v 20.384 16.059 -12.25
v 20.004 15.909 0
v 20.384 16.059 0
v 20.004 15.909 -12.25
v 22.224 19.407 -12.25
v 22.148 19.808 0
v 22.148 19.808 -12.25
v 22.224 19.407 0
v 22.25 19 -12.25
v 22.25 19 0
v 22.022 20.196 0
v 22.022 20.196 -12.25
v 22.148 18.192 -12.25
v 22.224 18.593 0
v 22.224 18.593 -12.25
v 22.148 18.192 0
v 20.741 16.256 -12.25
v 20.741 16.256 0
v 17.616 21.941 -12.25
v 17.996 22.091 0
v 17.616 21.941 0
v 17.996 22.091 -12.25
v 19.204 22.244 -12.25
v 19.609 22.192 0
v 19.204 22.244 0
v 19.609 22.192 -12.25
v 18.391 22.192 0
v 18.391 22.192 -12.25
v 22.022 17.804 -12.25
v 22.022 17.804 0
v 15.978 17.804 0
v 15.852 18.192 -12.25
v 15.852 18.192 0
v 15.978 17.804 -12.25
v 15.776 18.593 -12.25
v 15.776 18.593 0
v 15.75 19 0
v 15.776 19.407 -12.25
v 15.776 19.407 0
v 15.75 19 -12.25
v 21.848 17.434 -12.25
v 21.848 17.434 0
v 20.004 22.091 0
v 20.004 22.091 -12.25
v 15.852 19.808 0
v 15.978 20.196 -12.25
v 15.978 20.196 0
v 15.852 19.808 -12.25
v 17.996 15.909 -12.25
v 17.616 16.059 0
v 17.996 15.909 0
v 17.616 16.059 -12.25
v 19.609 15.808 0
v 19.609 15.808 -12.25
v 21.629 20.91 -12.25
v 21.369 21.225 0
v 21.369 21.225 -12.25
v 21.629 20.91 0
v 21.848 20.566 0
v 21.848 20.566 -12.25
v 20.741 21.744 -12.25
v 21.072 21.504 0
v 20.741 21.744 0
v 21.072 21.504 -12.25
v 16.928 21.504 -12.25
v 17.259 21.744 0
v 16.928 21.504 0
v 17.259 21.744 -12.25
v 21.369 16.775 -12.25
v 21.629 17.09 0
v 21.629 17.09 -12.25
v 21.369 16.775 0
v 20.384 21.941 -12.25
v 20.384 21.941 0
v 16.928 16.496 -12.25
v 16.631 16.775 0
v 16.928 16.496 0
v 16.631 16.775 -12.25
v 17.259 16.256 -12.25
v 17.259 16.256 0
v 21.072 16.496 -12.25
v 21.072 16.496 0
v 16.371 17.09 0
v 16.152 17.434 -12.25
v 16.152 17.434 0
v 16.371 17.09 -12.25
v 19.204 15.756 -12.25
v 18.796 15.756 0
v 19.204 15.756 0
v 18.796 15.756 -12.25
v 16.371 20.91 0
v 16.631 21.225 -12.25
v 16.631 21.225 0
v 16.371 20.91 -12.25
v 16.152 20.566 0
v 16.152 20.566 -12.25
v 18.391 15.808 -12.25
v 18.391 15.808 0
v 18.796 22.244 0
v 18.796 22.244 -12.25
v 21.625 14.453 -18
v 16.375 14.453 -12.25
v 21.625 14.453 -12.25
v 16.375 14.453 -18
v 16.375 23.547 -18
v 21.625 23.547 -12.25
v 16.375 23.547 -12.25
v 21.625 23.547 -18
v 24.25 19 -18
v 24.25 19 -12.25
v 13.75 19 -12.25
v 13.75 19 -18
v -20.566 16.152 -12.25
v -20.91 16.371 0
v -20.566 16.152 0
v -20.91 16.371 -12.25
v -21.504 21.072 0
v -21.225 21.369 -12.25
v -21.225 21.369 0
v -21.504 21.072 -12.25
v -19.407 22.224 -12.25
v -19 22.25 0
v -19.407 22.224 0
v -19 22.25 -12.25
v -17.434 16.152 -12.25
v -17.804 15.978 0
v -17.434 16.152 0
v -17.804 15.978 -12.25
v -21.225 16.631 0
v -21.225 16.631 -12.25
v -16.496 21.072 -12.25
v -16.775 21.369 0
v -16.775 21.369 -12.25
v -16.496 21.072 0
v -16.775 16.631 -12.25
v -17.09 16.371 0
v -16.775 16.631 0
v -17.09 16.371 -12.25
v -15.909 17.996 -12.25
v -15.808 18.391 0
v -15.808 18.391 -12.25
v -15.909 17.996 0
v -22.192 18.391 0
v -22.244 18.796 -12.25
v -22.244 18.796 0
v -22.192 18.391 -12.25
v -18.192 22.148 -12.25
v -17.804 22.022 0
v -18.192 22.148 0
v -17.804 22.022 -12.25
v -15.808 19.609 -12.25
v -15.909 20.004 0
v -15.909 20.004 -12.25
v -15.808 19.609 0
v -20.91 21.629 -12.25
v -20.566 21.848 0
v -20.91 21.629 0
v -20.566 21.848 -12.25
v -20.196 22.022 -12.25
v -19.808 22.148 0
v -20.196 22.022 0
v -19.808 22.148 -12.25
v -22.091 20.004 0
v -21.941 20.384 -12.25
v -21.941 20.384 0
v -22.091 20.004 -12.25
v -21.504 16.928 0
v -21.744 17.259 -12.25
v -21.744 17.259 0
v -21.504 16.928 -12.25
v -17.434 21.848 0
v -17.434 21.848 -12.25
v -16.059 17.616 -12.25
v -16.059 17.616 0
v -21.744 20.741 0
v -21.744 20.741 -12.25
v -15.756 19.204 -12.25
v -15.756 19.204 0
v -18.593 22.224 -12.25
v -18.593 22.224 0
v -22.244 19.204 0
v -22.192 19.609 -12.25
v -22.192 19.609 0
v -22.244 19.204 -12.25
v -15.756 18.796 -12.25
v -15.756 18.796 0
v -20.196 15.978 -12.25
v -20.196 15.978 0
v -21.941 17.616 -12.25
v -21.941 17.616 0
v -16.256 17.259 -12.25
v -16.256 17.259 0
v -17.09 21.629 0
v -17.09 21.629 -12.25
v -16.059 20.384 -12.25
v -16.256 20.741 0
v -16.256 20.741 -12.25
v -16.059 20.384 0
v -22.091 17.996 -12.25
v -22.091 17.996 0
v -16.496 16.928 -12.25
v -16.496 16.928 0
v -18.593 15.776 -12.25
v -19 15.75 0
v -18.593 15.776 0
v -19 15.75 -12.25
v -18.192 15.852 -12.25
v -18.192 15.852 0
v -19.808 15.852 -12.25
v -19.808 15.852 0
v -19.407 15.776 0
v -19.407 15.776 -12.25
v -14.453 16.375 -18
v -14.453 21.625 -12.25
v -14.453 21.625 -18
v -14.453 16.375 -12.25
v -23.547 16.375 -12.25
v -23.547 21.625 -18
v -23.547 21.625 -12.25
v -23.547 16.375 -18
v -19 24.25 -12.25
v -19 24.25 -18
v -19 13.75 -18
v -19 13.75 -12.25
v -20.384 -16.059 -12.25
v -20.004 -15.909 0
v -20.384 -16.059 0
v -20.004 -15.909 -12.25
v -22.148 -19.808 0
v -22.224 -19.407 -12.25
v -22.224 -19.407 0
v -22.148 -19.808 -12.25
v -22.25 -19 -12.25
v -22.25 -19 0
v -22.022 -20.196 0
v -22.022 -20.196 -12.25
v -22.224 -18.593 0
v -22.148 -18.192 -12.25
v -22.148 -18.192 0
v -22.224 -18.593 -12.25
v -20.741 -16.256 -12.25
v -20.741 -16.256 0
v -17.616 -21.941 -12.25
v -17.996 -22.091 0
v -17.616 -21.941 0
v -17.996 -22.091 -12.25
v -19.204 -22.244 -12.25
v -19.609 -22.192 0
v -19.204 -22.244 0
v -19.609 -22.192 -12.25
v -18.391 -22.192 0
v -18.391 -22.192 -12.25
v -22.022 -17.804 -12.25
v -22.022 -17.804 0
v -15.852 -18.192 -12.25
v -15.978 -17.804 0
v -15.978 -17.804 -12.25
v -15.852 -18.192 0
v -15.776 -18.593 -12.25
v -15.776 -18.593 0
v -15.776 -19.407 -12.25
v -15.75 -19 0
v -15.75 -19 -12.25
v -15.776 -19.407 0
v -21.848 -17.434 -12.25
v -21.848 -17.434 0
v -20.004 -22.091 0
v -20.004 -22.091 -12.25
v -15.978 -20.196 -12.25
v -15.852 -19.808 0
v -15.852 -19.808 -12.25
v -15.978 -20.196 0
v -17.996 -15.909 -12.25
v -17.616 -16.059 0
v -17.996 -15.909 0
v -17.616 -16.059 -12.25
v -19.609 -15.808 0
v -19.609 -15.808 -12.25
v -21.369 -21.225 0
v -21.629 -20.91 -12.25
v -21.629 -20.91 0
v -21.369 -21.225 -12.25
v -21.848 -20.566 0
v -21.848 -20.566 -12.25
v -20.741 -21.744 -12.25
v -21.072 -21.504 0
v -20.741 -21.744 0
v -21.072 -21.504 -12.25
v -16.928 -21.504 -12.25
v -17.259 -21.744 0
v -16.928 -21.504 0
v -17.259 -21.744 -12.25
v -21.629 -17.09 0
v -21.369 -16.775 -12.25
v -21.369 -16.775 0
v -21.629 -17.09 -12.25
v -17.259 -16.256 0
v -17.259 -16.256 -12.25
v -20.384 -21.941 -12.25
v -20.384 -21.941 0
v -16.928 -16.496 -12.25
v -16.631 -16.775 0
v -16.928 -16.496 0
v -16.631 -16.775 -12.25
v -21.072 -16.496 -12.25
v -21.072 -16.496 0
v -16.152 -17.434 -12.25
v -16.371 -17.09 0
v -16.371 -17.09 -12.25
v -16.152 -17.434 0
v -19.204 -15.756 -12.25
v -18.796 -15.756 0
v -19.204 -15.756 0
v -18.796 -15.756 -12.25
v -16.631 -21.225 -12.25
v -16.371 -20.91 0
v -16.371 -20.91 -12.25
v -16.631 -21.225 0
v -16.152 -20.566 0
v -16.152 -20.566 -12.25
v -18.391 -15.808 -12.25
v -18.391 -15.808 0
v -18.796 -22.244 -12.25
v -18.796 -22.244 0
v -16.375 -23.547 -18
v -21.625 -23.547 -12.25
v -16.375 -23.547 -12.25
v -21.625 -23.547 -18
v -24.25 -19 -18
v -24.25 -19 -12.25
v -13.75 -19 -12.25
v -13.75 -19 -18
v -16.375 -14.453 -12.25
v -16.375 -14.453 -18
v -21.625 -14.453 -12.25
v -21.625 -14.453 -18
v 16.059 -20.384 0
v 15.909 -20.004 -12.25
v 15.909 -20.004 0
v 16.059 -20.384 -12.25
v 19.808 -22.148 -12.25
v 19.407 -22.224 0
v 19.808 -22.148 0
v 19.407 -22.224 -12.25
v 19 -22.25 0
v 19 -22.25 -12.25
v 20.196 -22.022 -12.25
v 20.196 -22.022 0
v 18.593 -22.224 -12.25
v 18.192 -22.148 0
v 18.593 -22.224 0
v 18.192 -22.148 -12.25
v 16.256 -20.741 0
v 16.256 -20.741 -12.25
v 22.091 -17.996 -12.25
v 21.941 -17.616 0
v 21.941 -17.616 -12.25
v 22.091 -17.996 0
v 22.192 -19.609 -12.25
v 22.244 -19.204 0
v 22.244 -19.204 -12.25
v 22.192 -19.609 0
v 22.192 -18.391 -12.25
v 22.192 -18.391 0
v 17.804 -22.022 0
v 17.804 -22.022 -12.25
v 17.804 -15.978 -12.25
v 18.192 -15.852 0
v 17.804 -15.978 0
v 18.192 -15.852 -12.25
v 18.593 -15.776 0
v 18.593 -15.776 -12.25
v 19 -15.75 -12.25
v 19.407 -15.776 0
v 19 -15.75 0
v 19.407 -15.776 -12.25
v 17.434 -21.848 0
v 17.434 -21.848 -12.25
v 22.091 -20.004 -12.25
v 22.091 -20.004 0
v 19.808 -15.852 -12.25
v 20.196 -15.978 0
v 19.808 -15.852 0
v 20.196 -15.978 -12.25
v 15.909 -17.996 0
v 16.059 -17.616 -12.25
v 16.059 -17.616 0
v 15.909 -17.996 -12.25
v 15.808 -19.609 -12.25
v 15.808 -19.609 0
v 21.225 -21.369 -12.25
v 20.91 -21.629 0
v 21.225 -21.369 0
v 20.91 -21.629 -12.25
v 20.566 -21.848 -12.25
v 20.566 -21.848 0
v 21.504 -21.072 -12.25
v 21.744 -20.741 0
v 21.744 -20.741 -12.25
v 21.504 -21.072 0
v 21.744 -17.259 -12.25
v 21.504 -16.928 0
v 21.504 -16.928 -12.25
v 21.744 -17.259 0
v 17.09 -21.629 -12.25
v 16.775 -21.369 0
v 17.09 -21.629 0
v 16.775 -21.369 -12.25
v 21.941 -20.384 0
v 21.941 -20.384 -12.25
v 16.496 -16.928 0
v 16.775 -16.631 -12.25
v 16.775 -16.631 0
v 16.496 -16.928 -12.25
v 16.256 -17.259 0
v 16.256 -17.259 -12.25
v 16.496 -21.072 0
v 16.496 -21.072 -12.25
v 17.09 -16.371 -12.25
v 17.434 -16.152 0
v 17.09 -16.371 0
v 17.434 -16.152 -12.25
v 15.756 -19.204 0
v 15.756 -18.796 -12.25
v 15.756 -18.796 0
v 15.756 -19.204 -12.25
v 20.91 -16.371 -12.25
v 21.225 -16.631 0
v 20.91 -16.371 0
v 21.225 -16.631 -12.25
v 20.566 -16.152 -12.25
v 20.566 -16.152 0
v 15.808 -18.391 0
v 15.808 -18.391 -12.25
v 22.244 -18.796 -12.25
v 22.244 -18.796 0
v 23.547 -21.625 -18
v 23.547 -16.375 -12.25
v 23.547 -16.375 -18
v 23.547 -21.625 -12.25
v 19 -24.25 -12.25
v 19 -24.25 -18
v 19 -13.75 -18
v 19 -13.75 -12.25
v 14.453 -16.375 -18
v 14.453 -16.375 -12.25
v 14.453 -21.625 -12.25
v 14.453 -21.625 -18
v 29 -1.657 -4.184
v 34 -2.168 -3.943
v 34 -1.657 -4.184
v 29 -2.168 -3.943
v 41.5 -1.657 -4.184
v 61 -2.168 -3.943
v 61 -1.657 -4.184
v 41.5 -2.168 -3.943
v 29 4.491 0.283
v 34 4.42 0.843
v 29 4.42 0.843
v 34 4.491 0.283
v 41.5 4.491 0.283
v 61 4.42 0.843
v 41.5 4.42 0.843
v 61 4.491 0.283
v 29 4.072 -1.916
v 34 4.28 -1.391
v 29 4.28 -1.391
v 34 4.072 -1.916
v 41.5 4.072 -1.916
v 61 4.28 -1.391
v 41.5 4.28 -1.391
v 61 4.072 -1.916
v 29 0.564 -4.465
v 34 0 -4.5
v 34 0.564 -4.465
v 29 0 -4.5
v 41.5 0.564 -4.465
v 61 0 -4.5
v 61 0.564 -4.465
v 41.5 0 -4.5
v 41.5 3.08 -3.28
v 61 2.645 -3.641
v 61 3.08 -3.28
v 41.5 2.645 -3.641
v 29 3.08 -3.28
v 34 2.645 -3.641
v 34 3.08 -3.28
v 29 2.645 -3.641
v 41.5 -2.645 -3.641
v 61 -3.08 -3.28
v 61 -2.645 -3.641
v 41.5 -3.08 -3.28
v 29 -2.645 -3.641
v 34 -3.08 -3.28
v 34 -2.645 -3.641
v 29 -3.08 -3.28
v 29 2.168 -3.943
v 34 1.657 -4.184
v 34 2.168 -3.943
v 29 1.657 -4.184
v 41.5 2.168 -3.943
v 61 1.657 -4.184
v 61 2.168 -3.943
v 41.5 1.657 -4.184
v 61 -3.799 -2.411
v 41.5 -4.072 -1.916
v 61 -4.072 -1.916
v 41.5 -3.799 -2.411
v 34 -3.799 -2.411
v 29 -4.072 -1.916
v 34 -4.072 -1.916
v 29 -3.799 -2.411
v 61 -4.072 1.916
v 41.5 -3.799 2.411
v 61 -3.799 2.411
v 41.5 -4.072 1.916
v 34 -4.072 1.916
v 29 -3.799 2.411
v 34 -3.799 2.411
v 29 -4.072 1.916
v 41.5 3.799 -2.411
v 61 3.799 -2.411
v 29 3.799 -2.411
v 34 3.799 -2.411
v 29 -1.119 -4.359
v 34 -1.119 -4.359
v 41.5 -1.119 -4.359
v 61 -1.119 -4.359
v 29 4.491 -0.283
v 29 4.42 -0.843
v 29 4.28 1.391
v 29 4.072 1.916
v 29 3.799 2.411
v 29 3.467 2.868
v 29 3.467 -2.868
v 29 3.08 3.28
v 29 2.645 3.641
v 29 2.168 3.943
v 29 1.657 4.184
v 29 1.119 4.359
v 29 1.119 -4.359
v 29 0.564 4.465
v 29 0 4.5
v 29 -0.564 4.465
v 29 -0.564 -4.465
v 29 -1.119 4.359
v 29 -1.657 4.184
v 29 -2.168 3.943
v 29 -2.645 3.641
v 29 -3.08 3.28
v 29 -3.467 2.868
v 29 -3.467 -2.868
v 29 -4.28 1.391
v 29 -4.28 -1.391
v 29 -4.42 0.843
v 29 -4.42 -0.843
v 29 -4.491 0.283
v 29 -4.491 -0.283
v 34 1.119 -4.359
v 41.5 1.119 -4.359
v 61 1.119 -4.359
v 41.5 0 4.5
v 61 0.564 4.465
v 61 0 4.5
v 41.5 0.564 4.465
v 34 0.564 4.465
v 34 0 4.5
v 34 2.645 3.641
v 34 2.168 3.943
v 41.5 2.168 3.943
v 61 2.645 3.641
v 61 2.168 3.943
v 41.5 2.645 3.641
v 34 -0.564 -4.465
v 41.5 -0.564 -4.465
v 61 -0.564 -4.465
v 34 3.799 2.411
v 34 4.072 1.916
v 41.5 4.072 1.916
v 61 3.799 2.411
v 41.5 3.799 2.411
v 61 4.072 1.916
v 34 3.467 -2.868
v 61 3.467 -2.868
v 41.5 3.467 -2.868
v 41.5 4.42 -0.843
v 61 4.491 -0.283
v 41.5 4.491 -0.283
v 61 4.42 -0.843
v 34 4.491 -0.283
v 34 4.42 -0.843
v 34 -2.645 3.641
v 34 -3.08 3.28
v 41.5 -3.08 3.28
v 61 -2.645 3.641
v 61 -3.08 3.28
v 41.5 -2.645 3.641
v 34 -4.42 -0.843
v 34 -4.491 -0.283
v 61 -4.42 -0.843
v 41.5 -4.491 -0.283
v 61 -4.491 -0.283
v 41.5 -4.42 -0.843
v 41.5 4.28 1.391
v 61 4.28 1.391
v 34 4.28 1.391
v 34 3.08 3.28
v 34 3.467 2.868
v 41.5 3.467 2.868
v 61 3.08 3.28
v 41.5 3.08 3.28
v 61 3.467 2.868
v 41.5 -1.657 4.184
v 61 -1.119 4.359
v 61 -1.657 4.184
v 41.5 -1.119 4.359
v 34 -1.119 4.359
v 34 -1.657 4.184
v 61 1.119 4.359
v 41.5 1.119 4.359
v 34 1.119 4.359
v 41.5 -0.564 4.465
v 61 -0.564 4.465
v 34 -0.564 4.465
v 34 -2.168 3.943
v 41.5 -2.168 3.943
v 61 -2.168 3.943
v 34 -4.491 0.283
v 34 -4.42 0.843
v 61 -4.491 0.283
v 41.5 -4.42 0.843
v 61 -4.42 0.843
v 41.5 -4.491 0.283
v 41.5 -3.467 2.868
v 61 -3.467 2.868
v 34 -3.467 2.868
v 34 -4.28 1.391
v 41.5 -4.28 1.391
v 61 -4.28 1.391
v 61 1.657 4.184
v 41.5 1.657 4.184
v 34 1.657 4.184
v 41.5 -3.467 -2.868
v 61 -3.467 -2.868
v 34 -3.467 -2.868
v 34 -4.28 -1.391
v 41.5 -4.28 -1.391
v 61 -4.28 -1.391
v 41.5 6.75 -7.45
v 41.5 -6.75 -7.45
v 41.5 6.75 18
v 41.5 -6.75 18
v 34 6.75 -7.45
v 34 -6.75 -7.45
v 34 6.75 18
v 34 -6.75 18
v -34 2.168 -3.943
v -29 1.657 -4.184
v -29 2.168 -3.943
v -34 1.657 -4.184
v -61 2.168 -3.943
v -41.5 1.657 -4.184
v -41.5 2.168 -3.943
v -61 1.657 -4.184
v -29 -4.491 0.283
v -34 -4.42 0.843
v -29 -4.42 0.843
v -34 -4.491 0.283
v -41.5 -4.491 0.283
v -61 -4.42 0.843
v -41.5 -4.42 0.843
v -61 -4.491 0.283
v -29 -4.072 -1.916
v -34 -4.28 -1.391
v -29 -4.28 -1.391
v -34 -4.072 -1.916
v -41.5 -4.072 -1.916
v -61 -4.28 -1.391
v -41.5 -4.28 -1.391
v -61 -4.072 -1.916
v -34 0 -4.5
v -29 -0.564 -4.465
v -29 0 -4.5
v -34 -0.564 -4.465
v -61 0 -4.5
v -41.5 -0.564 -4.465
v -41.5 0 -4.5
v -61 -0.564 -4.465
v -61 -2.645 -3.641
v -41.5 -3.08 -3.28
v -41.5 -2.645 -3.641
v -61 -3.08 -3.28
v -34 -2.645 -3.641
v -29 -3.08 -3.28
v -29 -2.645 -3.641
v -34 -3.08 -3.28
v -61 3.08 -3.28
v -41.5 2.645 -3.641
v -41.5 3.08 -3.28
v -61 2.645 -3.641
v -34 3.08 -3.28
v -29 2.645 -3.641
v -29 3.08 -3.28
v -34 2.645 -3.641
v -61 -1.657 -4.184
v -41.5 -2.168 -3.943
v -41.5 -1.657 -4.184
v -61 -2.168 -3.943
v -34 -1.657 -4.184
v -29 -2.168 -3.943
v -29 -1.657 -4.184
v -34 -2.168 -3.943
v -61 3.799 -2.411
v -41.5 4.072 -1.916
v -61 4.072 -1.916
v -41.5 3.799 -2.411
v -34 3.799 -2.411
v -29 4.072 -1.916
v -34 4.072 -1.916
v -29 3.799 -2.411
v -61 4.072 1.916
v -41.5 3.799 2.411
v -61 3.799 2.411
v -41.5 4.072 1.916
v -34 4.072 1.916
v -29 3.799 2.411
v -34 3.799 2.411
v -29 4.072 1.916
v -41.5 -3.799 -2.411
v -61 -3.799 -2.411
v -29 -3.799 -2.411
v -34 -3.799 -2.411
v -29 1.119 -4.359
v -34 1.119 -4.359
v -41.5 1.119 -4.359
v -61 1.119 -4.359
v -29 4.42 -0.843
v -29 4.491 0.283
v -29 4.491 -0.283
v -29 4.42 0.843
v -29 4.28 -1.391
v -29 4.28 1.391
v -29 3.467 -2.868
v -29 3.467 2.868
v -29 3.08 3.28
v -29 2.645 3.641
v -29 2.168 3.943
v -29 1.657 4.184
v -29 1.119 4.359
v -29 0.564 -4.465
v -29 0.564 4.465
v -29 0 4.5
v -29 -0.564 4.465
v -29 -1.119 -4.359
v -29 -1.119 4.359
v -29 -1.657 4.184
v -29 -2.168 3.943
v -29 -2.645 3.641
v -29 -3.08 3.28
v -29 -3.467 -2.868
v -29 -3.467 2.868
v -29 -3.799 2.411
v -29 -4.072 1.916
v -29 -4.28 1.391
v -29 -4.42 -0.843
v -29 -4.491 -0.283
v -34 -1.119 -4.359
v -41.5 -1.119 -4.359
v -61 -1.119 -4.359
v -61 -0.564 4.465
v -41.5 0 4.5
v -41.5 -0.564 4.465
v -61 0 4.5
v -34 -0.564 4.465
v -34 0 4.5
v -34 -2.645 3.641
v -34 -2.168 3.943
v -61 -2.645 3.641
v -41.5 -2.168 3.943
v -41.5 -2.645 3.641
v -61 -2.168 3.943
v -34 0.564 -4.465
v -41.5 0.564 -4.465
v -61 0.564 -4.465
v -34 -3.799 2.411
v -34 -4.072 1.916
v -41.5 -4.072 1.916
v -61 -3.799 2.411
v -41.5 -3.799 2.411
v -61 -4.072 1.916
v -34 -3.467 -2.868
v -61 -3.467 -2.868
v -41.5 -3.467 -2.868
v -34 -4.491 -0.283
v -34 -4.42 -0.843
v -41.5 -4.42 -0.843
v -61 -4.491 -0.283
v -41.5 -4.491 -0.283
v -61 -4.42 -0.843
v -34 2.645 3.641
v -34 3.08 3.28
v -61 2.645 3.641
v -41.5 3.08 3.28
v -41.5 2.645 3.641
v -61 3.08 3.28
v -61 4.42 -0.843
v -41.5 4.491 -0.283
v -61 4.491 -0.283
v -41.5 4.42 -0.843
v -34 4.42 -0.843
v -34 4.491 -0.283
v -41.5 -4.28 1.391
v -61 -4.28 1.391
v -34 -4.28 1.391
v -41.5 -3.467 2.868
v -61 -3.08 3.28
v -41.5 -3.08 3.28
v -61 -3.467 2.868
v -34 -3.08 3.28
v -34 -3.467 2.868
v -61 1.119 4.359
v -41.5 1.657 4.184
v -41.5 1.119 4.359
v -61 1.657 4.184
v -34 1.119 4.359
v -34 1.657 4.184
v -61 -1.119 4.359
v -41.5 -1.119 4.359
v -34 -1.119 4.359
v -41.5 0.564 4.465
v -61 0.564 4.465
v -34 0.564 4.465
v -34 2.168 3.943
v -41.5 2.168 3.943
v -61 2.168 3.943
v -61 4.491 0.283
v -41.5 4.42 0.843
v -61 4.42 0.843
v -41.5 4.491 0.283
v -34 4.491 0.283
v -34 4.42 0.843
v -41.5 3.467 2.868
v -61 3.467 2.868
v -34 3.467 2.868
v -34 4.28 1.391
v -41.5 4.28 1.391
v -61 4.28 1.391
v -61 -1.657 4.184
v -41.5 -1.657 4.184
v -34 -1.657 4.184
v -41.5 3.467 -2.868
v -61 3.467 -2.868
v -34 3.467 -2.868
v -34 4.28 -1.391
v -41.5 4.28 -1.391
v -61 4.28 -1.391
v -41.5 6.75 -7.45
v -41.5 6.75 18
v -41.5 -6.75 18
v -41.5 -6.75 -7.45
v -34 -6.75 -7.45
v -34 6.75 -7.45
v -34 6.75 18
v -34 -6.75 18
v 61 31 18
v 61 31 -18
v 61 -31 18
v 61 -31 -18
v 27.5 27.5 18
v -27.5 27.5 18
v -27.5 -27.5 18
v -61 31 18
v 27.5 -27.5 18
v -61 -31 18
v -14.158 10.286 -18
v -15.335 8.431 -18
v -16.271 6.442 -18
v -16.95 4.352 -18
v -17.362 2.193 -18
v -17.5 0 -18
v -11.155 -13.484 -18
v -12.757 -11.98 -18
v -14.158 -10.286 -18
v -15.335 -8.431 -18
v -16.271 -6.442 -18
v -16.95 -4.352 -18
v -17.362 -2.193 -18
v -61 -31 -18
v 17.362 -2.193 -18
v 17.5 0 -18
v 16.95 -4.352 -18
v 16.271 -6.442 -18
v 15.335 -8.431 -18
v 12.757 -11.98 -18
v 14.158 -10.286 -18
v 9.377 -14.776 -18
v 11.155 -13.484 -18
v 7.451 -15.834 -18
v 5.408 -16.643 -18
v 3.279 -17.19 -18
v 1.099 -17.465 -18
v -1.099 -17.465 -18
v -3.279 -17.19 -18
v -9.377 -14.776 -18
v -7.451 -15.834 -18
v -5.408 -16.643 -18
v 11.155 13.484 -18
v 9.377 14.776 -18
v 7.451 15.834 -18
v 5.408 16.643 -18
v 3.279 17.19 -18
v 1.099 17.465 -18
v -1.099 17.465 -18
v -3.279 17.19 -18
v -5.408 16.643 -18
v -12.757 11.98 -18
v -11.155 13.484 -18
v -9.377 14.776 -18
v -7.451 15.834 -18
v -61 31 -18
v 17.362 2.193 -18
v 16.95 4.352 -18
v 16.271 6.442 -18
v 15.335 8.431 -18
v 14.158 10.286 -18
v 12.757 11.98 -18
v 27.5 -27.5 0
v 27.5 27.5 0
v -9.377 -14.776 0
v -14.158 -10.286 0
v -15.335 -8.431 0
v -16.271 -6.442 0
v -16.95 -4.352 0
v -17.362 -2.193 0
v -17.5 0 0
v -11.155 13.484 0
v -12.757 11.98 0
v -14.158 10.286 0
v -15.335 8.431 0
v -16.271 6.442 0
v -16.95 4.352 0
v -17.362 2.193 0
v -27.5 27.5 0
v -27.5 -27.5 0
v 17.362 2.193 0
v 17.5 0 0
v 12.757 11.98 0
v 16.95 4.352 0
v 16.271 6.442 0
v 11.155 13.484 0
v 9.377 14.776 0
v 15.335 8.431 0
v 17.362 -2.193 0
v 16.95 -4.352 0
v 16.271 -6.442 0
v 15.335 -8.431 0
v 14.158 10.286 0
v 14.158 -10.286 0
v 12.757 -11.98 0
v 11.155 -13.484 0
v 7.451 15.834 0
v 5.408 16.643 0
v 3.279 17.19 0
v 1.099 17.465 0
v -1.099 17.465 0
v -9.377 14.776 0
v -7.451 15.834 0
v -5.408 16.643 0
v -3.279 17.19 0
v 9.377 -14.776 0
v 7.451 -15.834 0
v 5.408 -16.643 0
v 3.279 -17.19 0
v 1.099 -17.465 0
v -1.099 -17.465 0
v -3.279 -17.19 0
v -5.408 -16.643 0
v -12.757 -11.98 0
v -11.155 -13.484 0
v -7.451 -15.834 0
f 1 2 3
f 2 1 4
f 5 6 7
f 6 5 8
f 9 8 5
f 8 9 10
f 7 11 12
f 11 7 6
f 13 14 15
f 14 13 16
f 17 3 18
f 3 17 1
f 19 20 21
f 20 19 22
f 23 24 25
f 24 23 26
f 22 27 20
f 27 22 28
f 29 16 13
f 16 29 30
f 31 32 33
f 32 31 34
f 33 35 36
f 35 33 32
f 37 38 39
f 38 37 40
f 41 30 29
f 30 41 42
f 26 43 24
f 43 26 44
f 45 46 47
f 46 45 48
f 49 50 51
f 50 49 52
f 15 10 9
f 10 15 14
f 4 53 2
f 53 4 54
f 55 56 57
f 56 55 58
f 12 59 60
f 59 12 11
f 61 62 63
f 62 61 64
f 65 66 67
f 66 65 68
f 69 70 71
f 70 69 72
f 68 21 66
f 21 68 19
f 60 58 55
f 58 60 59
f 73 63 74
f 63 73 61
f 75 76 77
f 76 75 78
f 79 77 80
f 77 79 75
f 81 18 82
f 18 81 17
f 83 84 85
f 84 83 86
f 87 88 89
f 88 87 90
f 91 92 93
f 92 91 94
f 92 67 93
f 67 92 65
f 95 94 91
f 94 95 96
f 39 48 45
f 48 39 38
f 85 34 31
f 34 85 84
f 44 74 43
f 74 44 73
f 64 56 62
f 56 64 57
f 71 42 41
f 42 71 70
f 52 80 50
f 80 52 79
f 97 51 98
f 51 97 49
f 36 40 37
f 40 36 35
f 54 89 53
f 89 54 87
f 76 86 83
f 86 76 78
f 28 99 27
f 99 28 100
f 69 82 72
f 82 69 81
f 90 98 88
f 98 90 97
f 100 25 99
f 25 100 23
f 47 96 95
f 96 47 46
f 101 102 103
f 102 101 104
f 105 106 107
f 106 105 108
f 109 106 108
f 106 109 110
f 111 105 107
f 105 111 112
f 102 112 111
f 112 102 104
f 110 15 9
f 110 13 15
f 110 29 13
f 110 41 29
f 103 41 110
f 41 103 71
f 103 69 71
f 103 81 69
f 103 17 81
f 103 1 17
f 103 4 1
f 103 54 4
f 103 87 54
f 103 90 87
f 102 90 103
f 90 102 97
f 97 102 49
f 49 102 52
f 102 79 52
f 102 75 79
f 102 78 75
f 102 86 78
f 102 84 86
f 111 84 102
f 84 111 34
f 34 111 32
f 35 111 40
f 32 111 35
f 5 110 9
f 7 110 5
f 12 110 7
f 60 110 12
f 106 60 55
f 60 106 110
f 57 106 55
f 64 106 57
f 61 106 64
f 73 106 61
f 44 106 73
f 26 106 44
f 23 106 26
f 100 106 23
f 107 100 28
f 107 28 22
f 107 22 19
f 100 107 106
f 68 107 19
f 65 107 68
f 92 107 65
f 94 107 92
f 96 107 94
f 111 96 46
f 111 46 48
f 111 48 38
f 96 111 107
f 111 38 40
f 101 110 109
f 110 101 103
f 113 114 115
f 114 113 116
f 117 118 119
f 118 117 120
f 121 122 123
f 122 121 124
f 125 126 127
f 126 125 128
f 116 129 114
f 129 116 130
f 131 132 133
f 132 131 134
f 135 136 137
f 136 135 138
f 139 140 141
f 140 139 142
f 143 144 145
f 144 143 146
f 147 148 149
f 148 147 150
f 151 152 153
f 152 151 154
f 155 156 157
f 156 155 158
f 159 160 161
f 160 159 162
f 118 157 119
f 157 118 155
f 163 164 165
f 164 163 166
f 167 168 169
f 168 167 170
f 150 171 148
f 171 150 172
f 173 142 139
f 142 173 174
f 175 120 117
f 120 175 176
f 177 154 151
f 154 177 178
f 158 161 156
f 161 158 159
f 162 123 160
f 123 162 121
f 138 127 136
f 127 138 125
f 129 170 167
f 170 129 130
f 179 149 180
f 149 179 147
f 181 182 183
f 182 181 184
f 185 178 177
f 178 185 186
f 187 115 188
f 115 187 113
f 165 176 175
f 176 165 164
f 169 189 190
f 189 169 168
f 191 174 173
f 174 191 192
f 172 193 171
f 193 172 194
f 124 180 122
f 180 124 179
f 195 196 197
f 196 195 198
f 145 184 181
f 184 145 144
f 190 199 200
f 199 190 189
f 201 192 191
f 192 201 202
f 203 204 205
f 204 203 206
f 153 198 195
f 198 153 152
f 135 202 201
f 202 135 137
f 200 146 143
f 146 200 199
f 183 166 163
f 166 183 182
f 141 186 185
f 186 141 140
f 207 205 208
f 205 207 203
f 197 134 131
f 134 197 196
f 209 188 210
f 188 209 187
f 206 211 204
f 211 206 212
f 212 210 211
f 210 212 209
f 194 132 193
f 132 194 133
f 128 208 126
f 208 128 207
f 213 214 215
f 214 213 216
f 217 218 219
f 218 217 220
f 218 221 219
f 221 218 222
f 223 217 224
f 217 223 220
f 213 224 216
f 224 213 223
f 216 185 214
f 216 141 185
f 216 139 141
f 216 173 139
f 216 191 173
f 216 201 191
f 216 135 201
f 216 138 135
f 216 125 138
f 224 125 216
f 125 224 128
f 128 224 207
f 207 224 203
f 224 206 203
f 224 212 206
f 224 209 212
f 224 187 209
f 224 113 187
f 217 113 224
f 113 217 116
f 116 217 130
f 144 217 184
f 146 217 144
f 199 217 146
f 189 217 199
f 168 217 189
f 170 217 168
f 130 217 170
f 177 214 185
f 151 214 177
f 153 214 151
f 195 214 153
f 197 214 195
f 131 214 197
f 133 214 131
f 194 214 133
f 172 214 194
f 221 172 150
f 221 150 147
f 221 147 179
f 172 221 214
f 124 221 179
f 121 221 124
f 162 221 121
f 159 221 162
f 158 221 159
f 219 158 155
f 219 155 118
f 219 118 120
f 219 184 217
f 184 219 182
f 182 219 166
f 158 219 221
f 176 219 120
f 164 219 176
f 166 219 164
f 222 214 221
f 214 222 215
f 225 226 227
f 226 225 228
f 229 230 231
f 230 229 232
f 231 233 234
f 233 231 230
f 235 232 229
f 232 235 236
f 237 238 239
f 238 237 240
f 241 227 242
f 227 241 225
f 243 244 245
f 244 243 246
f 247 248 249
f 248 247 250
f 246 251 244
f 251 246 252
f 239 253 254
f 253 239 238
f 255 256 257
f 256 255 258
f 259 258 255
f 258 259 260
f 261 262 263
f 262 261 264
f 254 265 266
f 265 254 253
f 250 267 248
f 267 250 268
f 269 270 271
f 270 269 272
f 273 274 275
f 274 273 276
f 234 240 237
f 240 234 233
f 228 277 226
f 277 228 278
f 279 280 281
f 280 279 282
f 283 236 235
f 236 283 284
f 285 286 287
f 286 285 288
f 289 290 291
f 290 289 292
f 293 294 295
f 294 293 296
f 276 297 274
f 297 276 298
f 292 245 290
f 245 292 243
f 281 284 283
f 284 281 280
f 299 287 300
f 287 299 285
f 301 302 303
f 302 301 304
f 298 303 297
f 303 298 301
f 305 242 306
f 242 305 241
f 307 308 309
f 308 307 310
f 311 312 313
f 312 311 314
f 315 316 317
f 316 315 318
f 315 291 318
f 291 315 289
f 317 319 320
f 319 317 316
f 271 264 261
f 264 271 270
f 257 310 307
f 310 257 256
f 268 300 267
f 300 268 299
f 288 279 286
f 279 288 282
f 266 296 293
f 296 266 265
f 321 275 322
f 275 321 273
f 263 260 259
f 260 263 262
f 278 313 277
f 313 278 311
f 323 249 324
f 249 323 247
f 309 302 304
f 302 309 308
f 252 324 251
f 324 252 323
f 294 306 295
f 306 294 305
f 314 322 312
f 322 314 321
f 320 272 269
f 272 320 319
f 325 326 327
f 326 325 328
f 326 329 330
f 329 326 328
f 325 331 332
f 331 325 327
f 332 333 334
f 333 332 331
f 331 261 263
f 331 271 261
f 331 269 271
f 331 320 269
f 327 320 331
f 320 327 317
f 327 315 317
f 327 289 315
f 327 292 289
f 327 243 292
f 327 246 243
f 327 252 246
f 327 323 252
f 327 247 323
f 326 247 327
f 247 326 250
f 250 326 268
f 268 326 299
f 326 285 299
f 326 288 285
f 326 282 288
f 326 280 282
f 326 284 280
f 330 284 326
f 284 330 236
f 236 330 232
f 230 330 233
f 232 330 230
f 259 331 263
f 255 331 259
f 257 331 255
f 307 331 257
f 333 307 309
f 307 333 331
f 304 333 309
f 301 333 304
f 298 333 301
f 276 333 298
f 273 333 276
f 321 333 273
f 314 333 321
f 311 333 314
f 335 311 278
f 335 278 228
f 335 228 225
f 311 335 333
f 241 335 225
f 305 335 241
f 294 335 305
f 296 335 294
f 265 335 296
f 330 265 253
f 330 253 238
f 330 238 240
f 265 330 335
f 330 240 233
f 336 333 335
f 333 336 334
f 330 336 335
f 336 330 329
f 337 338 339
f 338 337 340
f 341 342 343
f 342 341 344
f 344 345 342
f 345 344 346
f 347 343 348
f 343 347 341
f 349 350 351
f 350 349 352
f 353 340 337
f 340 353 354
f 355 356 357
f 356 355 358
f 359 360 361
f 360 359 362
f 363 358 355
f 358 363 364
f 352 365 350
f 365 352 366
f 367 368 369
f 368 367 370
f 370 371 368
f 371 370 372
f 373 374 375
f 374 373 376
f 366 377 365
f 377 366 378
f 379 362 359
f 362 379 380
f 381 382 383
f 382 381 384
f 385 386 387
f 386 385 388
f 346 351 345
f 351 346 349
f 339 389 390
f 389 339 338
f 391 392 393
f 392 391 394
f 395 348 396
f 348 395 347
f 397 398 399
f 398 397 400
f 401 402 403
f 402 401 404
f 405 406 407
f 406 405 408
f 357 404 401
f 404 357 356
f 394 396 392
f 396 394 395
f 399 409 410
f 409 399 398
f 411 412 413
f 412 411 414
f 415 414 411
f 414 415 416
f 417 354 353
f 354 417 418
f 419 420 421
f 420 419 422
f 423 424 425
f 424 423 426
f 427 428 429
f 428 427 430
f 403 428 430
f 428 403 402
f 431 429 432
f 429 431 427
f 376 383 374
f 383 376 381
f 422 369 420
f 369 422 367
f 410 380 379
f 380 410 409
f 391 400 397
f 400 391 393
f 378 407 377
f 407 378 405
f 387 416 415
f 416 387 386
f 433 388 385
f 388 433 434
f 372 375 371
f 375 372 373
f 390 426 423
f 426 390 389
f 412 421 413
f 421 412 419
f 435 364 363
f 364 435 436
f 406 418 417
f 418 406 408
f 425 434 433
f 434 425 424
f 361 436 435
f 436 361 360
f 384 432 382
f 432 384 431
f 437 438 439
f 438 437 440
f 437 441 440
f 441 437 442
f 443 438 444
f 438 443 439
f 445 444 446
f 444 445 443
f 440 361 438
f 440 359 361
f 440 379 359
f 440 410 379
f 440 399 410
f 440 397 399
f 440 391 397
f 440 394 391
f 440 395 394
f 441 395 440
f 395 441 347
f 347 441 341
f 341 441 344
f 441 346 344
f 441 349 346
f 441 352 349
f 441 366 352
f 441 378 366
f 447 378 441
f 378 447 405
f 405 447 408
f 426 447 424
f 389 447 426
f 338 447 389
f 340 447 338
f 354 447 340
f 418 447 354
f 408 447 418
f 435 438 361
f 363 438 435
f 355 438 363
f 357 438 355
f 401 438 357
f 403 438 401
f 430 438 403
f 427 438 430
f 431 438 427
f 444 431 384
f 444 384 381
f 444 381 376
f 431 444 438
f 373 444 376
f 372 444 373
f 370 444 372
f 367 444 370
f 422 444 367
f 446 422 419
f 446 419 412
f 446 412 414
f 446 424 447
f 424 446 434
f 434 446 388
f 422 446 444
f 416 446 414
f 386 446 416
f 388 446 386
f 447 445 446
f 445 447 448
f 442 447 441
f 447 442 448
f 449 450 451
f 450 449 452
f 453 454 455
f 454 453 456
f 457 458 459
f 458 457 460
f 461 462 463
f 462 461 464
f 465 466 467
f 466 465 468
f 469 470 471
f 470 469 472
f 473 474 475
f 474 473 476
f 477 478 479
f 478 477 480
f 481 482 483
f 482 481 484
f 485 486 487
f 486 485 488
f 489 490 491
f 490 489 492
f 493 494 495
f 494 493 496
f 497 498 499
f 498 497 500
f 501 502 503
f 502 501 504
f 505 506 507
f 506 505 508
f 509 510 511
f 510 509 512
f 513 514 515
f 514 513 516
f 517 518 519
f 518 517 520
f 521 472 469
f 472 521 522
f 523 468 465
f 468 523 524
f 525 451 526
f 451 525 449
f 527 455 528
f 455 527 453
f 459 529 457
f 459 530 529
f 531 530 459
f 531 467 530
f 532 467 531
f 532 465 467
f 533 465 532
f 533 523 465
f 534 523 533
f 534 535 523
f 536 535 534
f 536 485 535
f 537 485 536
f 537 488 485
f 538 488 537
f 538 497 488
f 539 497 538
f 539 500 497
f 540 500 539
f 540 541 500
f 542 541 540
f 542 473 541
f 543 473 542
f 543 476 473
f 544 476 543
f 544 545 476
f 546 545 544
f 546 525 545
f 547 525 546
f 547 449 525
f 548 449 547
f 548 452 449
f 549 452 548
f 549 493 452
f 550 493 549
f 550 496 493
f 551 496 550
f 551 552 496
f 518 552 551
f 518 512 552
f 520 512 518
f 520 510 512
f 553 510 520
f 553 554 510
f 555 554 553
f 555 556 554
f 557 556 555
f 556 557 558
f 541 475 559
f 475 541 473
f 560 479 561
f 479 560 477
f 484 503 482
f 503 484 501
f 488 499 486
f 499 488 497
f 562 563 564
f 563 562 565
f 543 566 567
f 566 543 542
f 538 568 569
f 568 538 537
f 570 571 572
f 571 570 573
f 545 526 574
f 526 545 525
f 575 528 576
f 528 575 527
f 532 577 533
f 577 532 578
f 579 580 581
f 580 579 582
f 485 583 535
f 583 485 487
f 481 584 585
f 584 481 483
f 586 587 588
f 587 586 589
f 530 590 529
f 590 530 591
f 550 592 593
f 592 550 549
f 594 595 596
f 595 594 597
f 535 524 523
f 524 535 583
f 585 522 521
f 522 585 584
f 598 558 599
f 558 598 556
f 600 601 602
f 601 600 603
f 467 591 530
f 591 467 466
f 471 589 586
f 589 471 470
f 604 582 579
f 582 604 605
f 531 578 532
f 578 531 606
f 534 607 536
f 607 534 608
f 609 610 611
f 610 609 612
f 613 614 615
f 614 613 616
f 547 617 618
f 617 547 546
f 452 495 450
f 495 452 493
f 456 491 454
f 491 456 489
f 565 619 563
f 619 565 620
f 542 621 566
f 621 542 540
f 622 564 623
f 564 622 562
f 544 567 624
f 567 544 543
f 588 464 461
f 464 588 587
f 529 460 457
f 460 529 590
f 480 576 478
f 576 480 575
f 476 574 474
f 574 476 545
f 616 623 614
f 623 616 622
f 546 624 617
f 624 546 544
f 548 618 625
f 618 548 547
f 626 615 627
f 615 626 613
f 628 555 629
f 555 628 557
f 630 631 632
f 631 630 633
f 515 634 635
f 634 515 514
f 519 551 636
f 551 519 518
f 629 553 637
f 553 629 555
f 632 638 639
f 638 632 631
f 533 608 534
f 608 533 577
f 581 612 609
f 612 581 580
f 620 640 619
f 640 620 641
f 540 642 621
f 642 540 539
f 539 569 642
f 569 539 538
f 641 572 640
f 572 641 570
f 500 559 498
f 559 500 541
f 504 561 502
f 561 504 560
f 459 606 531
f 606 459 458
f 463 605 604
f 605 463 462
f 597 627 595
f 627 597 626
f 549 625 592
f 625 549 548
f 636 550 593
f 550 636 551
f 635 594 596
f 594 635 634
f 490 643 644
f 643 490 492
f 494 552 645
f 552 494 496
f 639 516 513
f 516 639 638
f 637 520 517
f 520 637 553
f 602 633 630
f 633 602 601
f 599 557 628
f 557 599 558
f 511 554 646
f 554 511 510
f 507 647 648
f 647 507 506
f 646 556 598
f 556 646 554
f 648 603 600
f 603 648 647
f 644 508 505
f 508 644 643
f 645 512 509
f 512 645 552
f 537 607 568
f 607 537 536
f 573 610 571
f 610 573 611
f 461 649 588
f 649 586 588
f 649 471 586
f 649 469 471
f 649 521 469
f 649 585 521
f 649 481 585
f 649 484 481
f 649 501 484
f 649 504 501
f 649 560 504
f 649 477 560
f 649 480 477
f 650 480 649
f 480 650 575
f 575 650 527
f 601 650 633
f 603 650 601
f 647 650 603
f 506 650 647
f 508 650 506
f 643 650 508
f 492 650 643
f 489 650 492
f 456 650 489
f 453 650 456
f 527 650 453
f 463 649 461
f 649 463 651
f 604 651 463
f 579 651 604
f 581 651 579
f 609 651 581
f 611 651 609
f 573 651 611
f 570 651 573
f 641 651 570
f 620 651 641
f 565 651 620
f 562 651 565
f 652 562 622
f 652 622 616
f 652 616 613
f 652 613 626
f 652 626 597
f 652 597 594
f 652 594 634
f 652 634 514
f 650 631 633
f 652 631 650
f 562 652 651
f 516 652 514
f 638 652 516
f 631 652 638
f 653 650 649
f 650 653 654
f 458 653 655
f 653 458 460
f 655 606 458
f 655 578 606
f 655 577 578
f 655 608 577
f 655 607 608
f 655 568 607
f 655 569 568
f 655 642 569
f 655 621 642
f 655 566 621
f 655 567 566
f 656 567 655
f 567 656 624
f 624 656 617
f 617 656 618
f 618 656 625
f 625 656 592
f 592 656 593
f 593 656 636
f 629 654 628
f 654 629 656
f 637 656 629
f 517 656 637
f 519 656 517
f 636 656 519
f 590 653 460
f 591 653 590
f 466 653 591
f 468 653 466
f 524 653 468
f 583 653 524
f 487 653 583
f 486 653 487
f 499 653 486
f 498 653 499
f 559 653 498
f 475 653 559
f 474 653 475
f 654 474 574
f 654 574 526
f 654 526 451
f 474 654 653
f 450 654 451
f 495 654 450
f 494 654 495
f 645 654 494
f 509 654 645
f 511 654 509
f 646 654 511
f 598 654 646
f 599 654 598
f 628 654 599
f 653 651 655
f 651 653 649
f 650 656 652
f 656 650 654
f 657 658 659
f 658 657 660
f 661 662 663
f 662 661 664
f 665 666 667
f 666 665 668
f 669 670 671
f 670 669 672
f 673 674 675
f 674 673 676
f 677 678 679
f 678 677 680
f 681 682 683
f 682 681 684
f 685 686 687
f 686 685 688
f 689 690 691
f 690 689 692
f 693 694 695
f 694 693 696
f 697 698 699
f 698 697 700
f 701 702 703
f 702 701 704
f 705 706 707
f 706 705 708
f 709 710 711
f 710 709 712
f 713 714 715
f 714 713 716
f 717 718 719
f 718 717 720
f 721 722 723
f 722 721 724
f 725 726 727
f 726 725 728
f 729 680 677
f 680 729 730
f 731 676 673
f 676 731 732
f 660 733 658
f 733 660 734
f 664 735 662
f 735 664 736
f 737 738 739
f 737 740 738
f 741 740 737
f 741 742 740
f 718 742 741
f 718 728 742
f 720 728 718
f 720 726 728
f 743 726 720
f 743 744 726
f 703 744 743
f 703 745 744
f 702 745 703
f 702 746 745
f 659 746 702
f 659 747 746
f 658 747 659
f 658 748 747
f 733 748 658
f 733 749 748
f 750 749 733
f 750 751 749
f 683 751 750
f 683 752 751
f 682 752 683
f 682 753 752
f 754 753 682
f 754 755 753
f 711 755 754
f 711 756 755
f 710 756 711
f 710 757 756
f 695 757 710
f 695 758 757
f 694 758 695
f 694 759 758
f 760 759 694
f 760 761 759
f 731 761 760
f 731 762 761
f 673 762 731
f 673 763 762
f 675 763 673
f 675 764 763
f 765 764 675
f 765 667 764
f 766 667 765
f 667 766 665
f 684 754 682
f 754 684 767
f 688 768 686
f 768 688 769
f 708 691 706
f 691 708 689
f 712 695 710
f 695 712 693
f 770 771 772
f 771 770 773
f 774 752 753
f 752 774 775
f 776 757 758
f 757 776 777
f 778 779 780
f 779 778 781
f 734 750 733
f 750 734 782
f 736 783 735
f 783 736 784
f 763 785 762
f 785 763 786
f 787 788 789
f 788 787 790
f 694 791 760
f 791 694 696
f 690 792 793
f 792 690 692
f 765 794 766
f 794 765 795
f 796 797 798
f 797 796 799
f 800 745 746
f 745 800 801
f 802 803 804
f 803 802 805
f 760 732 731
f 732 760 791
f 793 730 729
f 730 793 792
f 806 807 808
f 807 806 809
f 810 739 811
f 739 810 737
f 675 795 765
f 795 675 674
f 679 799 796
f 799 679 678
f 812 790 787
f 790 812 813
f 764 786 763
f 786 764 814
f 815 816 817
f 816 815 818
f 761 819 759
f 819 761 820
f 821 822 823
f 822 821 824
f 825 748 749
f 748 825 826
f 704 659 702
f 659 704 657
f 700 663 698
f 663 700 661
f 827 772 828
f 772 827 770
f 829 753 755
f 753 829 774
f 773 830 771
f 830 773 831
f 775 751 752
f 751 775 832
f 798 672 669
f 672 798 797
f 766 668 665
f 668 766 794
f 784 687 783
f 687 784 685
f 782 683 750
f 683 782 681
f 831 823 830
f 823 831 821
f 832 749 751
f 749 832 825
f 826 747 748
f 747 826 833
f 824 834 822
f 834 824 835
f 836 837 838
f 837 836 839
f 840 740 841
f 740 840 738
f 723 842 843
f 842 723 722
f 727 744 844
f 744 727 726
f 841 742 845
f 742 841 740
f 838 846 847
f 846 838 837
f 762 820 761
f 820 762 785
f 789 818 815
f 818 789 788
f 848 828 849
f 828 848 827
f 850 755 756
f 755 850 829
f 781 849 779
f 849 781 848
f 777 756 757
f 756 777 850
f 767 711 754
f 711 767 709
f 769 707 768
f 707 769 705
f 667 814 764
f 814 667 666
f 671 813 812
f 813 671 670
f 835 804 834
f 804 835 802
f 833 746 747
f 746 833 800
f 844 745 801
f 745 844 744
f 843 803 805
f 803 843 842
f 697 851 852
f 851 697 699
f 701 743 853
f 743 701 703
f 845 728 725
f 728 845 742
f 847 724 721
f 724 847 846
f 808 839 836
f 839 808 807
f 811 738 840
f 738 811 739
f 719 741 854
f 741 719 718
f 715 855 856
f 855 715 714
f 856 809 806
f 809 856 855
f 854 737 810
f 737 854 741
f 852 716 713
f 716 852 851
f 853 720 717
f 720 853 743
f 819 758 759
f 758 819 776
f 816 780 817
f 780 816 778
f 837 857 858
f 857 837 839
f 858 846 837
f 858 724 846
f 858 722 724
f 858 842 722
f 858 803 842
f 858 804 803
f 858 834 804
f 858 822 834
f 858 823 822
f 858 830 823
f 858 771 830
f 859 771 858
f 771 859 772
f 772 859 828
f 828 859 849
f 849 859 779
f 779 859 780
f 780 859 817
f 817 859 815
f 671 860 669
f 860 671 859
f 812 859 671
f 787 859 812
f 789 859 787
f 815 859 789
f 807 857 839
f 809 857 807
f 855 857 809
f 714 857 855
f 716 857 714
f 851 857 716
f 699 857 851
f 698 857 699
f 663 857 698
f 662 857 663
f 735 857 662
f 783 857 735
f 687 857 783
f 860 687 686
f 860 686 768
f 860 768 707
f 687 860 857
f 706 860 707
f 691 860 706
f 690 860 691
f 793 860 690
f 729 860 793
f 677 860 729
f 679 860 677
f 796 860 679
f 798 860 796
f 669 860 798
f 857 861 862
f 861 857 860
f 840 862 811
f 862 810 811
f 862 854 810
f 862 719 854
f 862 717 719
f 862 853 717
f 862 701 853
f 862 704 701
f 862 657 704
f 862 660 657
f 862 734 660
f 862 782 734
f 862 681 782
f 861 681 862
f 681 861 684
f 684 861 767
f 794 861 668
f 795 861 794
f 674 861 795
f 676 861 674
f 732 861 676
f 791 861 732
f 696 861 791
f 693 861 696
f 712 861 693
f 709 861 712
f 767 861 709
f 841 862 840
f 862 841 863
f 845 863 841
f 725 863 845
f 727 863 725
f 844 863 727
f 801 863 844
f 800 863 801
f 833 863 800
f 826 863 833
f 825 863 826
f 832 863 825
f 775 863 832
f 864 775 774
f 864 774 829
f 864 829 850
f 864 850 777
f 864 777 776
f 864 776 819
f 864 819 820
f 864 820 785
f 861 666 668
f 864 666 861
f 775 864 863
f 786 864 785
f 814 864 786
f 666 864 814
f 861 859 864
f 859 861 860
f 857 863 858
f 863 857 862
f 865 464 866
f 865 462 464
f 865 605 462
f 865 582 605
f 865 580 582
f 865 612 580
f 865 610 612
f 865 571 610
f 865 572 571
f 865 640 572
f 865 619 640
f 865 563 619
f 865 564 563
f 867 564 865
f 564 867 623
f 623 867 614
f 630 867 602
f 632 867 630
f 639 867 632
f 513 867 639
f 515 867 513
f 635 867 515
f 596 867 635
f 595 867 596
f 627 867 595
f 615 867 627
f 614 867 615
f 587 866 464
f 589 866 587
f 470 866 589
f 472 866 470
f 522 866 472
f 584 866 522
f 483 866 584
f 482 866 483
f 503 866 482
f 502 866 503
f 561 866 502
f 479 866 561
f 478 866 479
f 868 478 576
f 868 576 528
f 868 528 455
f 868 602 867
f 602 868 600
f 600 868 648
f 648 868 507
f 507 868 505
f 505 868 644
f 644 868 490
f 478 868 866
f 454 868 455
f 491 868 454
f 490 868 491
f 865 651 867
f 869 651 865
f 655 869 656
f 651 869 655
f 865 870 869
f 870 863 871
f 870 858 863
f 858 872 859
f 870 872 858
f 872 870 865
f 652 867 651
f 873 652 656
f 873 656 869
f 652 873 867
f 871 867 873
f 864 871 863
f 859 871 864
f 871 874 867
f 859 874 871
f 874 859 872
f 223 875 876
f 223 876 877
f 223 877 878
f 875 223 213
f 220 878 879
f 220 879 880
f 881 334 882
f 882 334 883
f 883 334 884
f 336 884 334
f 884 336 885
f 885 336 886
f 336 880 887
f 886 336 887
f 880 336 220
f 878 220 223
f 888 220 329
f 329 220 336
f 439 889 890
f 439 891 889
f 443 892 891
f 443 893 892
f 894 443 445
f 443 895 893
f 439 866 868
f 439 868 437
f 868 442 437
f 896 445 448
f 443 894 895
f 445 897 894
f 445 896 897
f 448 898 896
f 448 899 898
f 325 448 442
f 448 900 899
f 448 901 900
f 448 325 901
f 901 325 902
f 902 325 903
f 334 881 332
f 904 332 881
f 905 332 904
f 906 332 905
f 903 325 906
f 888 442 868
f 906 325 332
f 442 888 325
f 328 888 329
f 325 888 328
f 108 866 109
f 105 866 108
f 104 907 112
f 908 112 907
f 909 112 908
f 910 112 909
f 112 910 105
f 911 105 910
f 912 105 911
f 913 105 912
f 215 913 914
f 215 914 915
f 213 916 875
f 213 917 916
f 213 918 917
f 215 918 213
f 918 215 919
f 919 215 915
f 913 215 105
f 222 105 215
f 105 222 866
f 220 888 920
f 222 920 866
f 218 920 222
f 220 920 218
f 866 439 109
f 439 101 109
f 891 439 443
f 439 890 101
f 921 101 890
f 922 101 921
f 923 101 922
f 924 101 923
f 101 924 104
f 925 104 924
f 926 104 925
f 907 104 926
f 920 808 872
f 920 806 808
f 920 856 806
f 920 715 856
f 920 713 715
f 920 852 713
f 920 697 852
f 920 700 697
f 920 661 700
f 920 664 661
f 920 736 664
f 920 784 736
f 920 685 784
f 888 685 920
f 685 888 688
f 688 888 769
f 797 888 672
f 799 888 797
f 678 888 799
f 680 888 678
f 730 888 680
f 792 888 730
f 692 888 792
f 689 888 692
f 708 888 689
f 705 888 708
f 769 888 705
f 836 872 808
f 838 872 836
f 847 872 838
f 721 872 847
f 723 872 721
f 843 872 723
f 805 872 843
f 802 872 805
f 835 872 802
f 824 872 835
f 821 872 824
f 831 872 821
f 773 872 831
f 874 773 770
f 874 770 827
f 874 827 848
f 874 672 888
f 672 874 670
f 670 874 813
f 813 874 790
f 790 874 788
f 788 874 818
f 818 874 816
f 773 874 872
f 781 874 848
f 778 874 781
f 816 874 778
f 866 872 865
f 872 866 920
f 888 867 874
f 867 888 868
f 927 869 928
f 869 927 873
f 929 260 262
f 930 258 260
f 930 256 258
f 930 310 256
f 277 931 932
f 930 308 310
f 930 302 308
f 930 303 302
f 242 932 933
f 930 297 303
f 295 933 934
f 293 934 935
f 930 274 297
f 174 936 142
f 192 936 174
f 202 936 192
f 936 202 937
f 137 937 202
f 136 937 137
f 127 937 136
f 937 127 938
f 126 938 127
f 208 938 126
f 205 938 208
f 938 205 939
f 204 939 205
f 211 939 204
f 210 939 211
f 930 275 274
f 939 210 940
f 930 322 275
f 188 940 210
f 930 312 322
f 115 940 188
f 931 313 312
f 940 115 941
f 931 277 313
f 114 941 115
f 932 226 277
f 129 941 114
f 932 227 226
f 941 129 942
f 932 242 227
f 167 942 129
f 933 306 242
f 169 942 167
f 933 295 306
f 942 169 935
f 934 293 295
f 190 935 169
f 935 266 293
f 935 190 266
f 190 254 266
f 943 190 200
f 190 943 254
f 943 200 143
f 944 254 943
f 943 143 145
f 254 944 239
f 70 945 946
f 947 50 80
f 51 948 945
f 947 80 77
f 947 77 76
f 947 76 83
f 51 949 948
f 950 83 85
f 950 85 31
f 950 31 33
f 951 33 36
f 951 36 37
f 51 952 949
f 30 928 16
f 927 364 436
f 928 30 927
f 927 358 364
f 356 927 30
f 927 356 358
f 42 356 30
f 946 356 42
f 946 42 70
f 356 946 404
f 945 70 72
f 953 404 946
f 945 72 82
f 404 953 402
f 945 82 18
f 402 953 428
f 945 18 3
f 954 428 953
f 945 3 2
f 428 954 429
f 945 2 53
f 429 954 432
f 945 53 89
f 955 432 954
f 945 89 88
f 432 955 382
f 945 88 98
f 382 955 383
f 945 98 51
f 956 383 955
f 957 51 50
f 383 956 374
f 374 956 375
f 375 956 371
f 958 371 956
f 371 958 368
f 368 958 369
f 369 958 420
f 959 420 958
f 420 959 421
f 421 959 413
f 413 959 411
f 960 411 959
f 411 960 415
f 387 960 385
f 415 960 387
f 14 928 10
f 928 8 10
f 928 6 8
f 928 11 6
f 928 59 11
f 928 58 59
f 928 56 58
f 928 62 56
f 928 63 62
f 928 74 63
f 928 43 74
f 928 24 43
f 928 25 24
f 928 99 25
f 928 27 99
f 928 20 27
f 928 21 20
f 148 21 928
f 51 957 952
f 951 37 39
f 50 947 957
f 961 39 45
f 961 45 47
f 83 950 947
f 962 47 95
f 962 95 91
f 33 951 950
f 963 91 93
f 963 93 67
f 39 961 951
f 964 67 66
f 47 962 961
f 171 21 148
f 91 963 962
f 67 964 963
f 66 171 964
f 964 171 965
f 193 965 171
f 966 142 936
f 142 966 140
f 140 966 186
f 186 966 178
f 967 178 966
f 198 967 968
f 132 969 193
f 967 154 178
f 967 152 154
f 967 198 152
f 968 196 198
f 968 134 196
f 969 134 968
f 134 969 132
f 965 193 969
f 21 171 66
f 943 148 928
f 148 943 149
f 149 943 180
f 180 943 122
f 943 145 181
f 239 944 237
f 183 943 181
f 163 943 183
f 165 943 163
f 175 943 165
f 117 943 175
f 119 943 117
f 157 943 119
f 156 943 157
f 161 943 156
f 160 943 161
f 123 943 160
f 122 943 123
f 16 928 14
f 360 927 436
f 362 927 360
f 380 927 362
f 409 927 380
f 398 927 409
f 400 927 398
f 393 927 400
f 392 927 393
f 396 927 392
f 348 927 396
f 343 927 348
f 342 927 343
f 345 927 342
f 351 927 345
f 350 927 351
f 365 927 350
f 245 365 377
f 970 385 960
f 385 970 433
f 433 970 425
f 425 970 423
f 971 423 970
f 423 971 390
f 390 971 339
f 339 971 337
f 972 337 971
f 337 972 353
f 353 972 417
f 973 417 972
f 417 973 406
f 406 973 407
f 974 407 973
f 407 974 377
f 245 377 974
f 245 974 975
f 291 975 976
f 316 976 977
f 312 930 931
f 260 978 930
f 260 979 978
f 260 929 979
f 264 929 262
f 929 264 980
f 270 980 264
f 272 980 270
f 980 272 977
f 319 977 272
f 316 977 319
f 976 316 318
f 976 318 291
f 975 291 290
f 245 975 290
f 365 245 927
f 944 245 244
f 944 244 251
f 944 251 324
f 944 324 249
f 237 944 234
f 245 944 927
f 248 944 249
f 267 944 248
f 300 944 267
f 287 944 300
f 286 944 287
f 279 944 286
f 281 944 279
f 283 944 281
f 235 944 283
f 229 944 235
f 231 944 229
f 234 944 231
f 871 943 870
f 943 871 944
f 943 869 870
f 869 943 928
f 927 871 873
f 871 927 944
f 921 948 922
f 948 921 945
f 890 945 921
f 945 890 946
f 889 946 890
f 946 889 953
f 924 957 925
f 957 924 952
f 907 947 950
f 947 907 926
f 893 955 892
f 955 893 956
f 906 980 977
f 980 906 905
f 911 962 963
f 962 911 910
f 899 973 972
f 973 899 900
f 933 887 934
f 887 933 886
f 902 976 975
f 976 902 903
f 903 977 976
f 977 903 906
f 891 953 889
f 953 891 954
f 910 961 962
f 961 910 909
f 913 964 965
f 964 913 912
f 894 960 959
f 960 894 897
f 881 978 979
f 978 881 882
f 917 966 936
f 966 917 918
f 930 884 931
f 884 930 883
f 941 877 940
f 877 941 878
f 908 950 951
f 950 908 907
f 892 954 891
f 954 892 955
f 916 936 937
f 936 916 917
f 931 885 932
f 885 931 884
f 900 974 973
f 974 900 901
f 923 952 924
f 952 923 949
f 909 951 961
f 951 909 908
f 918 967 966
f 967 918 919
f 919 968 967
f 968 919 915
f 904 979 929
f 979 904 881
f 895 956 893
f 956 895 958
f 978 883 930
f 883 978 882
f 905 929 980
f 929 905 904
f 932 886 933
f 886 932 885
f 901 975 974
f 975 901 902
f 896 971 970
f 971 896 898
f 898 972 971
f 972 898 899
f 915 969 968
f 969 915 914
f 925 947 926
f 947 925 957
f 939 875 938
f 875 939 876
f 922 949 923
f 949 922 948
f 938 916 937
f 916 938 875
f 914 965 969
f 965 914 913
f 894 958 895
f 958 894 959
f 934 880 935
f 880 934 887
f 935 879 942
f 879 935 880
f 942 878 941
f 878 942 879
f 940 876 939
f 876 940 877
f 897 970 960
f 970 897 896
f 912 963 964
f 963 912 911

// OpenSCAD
// file: lib/naca4.scad
// Naca4.scad - library for parametric airfoils of 4 digit NACA series
// Code: Rudolf Huttary, Berlin 
// June 2015
// commercial use prohibited


// general use: for more examples refer to sampler.scad
// naca = naca digits or 3el vector  (default = 12 or [0, 0, .12])
// L    = chord length [mm]      (default= 100)
// N    = # sample points        (default= 81)
// h    = height [mm]            (default= 1)
// open = close at the thin end? (default = true)
// two equivalent example calls
 airfoil(naca = 2408, L = 60, N=1001, h = 30, open = false); 
// airfoil(naca = [.2, .4, .32], L = 60, N=1001, h = 30, open = false); 

module help()
{
  echo(str("\n\nList of signatures in lib:\n=================\n", 
  "module airfoil(naca=2412, L = 100, N = 81, h = 1, open = false) - renders airfoil object\n", 
  "module airfoil(naca=[.2, .4, .12], L = 100, N = 81, h = 1, open = false) - renders airfoil object using percentage for camber,  camber distance and thicknes\n", 
  "function airfoil_data(naca=12, L = 100, N = 81, open = false)\n",
  "=================\n")); 
}

help(); 
// this is the object
module airfoil(naca=12, L = 100, N = 81, h = 1, open = false)
{
  linear_extrude(height = h)
  polygon(points = airfoil_data(naca, L, N, open)); 
}

module hollow_airfoil(lnaca=12, L = 100, N = 81, h = 1, open = false, wall_thickness = 1)
{
    if (open){
        linear_extrude(height = h)

        if (wall_thickness>0){
            difference(){
                polygon(points = airfoil_data(naca, L, N, false));
                offset(delta = - wall_thickness, chamfer = false) polygon(points = airfoil_data(naca, L, N, open = false));
            }
        }
        else{
            difference(){
                offset(delta = - wall_thickness, chamfer = false) polygon(points = airfoil_data(naca, L, N, open = false));
                polygon(points = airfoil_data(naca, L, N, false));
            }
        }
    }
    else{

        linear_extrude(height = abs(wall_thickness))
            polygon(points = airfoil_data(naca, L, N, false)); 

        linear_extrude(height = h)
            difference(){
                polygon(points = airfoil_data(naca, L, N, open));
                offset(delta = - wall_thickness) polygon(points = airfoil_data(naca, L, N, open = false));
            }

        translate([0,0, h - wall_thickness])
            linear_extrude(height = abs(wall_thickness))
                polygon(points = airfoil_data(naca, L, N, false)); 

    }
}


// this is the main function providing the airfoil data
function airfoil_data(naca=12, L = 100, N = 81, open = false) = 
  let(Na = len(naca)!=3?NACA(naca):naca)
  let(A = [.2969, -0.126, -.3516, .2843, open?-0.1015:-0.1036])
  [for (b=[-180:360/(N):179.99]) 
    let (x = (1-cos(b))/2)  
    let(yt = sign(b)*Na[2]/.2*(A*[sqrt(x), x, x*x, x*x*x, x*x*x*x])) 
    Na[0]==0?L*[x, yt]:L*camber(x, yt, Na[0], Na[1], sign(b))];  


function trailing_edge_angle(naca=12, open = false) = 
  let(Na = len(naca)!=3?NACA(naca):naca)
  let(A = [.2969, -0.126, -.3516, .2843, open?-0.1015:-0.1036])
  let (x =0.999)  // set x near to airfoil trailing edge
  let(yt = Na[2]/.2*(A*[sqrt(x), x, x*x, x*x*x, x*x*x*x])) // calculate distance from x-axis at previously set position
  atan2(yt,1-x);  // calculate angle of triangle between end of airfoil. The triange height corresponds to previously calculated distance from x-axis

function surface_angle(x = 0.5, naca=12, open = false) = 
  let(Na = len(naca)!=3?NACA(naca):naca)
  let(A = [0.2969, -0.126, -0.3516, 0.2843, open?-0.1015:-0.1036])
  let(dy = Na[2]/0.2*(A*[(1/2)*(1/sqrt(x)), 1, 2*x, 3*x*x, 4*x*x*x])) // calculate derivative of airfoil function at the x point
  atan(dy);  // calculate  the angle from function derivative

function surface_distance(x = 0.5, naca=12, open = false) = 
  let(Na = len(naca)!=3?NACA(naca):naca)
  let(A = [0.2969, -0.126, -0.3516, 0.2843, open?-0.1015:-0.1036])
  Na[2]/.2*(A*[sqrt(x), x, x*x, x*x*x, x*x*x*x]); // calculate distance from x-axis at previously set position

// helper functions
function NACA(naca) = 
  let (M = floor(naca/1000))
  let (P = floor((naca-M*1000)/100)) 
  [M/100, P/10, floor(naca-M*1000-P*100)/100];  

function camber(x, y, M, P, upper) = 
  let(yc = (x<P)?M/P/P*(2*P*x-x*x): M/(1-P)/(1-P)*(1 - 2*P + 2*P*x -x*x))
  let(dy = (x<P)?2*M/P/P*(P-x):2*M/(1-P)/(1-P)*(P-x))
  let(th = atan(dy))
  [upper ? x - y*sin(th):x + y*sin(th), upper ? yc + y*cos(th):yc - y*cos(th)];
// main file
use <./lib/naca4.scad>
include <../Parameters.scad>
draft = true;

$fs =  draft? 50:100;
//$fa  = 10;


module 888_3007(draft){    /////// 1. díl (AZ, YAW)

difference(){
    union (){
        translate([-g3_7_length/2, -g3_7_width/2, -g3_7_height/2]) cube([g3_7_length, g3_7_width, g3_7_height]);
    }
    
    
    // zapusteni kuloveho loziska
    translate([-(bearing_efsm_17_width+bearing_efsm_space)/2, -(bearing_efsm_17_width+bearing_efsm_space)/2, g3_7_height/2-bearing_efsm_17_ag]) cube([bearing_efsm_17_width+bearing_efsm_space, bearing_efsm_17_width+bearing_efsm_space, g3_7_height]);
    
    // dira skrz pro lozisko
    translate([0,0, -(g3_7_height+global_clearance)/2])
        cylinder(d = bearing_efsm_17_db, h = g3_7_height+global_clearance, $fn=draft?50:100);
    
    // diry pro pridelani loziska
    for (i=[0:3]) rotate([0, 0, 90*i]){
    translate([bearing_efsm_17_boltd, bearing_efsm_17_boltd, -(g3_7_height+global_clearance)/2])
        cylinder(h=g3_7_height+global_clearance, d=bearing_efsm_17_n, $fn=draft? 50:100);
    translate([bearing_efsm_17_boltd, bearing_efsm_17_boltd, -(g3_7_height+global_clearance)/2])
        cylinder(h=M6_head_height, d=M6_head_diameter, $fn=6);
    }
        
    for (i=[0:1]) rotate([0,0,180*i]){
        translate([bearing_efsm_17_width/2 + 2, 0, 0]) rotate([0, 90, 0]) cylinder(d=M8_screw_diameter, h=100, $fn=draft? 50:100);
        translate([bearing_efsm_17_width/2+ 2 + 5, -M8_nut_pocket/2, -M8_nut_diameter/2]) cube([M8_nut_height, M8_nut_pocket, 30]);
    }


}

}

888_3007(draft);
